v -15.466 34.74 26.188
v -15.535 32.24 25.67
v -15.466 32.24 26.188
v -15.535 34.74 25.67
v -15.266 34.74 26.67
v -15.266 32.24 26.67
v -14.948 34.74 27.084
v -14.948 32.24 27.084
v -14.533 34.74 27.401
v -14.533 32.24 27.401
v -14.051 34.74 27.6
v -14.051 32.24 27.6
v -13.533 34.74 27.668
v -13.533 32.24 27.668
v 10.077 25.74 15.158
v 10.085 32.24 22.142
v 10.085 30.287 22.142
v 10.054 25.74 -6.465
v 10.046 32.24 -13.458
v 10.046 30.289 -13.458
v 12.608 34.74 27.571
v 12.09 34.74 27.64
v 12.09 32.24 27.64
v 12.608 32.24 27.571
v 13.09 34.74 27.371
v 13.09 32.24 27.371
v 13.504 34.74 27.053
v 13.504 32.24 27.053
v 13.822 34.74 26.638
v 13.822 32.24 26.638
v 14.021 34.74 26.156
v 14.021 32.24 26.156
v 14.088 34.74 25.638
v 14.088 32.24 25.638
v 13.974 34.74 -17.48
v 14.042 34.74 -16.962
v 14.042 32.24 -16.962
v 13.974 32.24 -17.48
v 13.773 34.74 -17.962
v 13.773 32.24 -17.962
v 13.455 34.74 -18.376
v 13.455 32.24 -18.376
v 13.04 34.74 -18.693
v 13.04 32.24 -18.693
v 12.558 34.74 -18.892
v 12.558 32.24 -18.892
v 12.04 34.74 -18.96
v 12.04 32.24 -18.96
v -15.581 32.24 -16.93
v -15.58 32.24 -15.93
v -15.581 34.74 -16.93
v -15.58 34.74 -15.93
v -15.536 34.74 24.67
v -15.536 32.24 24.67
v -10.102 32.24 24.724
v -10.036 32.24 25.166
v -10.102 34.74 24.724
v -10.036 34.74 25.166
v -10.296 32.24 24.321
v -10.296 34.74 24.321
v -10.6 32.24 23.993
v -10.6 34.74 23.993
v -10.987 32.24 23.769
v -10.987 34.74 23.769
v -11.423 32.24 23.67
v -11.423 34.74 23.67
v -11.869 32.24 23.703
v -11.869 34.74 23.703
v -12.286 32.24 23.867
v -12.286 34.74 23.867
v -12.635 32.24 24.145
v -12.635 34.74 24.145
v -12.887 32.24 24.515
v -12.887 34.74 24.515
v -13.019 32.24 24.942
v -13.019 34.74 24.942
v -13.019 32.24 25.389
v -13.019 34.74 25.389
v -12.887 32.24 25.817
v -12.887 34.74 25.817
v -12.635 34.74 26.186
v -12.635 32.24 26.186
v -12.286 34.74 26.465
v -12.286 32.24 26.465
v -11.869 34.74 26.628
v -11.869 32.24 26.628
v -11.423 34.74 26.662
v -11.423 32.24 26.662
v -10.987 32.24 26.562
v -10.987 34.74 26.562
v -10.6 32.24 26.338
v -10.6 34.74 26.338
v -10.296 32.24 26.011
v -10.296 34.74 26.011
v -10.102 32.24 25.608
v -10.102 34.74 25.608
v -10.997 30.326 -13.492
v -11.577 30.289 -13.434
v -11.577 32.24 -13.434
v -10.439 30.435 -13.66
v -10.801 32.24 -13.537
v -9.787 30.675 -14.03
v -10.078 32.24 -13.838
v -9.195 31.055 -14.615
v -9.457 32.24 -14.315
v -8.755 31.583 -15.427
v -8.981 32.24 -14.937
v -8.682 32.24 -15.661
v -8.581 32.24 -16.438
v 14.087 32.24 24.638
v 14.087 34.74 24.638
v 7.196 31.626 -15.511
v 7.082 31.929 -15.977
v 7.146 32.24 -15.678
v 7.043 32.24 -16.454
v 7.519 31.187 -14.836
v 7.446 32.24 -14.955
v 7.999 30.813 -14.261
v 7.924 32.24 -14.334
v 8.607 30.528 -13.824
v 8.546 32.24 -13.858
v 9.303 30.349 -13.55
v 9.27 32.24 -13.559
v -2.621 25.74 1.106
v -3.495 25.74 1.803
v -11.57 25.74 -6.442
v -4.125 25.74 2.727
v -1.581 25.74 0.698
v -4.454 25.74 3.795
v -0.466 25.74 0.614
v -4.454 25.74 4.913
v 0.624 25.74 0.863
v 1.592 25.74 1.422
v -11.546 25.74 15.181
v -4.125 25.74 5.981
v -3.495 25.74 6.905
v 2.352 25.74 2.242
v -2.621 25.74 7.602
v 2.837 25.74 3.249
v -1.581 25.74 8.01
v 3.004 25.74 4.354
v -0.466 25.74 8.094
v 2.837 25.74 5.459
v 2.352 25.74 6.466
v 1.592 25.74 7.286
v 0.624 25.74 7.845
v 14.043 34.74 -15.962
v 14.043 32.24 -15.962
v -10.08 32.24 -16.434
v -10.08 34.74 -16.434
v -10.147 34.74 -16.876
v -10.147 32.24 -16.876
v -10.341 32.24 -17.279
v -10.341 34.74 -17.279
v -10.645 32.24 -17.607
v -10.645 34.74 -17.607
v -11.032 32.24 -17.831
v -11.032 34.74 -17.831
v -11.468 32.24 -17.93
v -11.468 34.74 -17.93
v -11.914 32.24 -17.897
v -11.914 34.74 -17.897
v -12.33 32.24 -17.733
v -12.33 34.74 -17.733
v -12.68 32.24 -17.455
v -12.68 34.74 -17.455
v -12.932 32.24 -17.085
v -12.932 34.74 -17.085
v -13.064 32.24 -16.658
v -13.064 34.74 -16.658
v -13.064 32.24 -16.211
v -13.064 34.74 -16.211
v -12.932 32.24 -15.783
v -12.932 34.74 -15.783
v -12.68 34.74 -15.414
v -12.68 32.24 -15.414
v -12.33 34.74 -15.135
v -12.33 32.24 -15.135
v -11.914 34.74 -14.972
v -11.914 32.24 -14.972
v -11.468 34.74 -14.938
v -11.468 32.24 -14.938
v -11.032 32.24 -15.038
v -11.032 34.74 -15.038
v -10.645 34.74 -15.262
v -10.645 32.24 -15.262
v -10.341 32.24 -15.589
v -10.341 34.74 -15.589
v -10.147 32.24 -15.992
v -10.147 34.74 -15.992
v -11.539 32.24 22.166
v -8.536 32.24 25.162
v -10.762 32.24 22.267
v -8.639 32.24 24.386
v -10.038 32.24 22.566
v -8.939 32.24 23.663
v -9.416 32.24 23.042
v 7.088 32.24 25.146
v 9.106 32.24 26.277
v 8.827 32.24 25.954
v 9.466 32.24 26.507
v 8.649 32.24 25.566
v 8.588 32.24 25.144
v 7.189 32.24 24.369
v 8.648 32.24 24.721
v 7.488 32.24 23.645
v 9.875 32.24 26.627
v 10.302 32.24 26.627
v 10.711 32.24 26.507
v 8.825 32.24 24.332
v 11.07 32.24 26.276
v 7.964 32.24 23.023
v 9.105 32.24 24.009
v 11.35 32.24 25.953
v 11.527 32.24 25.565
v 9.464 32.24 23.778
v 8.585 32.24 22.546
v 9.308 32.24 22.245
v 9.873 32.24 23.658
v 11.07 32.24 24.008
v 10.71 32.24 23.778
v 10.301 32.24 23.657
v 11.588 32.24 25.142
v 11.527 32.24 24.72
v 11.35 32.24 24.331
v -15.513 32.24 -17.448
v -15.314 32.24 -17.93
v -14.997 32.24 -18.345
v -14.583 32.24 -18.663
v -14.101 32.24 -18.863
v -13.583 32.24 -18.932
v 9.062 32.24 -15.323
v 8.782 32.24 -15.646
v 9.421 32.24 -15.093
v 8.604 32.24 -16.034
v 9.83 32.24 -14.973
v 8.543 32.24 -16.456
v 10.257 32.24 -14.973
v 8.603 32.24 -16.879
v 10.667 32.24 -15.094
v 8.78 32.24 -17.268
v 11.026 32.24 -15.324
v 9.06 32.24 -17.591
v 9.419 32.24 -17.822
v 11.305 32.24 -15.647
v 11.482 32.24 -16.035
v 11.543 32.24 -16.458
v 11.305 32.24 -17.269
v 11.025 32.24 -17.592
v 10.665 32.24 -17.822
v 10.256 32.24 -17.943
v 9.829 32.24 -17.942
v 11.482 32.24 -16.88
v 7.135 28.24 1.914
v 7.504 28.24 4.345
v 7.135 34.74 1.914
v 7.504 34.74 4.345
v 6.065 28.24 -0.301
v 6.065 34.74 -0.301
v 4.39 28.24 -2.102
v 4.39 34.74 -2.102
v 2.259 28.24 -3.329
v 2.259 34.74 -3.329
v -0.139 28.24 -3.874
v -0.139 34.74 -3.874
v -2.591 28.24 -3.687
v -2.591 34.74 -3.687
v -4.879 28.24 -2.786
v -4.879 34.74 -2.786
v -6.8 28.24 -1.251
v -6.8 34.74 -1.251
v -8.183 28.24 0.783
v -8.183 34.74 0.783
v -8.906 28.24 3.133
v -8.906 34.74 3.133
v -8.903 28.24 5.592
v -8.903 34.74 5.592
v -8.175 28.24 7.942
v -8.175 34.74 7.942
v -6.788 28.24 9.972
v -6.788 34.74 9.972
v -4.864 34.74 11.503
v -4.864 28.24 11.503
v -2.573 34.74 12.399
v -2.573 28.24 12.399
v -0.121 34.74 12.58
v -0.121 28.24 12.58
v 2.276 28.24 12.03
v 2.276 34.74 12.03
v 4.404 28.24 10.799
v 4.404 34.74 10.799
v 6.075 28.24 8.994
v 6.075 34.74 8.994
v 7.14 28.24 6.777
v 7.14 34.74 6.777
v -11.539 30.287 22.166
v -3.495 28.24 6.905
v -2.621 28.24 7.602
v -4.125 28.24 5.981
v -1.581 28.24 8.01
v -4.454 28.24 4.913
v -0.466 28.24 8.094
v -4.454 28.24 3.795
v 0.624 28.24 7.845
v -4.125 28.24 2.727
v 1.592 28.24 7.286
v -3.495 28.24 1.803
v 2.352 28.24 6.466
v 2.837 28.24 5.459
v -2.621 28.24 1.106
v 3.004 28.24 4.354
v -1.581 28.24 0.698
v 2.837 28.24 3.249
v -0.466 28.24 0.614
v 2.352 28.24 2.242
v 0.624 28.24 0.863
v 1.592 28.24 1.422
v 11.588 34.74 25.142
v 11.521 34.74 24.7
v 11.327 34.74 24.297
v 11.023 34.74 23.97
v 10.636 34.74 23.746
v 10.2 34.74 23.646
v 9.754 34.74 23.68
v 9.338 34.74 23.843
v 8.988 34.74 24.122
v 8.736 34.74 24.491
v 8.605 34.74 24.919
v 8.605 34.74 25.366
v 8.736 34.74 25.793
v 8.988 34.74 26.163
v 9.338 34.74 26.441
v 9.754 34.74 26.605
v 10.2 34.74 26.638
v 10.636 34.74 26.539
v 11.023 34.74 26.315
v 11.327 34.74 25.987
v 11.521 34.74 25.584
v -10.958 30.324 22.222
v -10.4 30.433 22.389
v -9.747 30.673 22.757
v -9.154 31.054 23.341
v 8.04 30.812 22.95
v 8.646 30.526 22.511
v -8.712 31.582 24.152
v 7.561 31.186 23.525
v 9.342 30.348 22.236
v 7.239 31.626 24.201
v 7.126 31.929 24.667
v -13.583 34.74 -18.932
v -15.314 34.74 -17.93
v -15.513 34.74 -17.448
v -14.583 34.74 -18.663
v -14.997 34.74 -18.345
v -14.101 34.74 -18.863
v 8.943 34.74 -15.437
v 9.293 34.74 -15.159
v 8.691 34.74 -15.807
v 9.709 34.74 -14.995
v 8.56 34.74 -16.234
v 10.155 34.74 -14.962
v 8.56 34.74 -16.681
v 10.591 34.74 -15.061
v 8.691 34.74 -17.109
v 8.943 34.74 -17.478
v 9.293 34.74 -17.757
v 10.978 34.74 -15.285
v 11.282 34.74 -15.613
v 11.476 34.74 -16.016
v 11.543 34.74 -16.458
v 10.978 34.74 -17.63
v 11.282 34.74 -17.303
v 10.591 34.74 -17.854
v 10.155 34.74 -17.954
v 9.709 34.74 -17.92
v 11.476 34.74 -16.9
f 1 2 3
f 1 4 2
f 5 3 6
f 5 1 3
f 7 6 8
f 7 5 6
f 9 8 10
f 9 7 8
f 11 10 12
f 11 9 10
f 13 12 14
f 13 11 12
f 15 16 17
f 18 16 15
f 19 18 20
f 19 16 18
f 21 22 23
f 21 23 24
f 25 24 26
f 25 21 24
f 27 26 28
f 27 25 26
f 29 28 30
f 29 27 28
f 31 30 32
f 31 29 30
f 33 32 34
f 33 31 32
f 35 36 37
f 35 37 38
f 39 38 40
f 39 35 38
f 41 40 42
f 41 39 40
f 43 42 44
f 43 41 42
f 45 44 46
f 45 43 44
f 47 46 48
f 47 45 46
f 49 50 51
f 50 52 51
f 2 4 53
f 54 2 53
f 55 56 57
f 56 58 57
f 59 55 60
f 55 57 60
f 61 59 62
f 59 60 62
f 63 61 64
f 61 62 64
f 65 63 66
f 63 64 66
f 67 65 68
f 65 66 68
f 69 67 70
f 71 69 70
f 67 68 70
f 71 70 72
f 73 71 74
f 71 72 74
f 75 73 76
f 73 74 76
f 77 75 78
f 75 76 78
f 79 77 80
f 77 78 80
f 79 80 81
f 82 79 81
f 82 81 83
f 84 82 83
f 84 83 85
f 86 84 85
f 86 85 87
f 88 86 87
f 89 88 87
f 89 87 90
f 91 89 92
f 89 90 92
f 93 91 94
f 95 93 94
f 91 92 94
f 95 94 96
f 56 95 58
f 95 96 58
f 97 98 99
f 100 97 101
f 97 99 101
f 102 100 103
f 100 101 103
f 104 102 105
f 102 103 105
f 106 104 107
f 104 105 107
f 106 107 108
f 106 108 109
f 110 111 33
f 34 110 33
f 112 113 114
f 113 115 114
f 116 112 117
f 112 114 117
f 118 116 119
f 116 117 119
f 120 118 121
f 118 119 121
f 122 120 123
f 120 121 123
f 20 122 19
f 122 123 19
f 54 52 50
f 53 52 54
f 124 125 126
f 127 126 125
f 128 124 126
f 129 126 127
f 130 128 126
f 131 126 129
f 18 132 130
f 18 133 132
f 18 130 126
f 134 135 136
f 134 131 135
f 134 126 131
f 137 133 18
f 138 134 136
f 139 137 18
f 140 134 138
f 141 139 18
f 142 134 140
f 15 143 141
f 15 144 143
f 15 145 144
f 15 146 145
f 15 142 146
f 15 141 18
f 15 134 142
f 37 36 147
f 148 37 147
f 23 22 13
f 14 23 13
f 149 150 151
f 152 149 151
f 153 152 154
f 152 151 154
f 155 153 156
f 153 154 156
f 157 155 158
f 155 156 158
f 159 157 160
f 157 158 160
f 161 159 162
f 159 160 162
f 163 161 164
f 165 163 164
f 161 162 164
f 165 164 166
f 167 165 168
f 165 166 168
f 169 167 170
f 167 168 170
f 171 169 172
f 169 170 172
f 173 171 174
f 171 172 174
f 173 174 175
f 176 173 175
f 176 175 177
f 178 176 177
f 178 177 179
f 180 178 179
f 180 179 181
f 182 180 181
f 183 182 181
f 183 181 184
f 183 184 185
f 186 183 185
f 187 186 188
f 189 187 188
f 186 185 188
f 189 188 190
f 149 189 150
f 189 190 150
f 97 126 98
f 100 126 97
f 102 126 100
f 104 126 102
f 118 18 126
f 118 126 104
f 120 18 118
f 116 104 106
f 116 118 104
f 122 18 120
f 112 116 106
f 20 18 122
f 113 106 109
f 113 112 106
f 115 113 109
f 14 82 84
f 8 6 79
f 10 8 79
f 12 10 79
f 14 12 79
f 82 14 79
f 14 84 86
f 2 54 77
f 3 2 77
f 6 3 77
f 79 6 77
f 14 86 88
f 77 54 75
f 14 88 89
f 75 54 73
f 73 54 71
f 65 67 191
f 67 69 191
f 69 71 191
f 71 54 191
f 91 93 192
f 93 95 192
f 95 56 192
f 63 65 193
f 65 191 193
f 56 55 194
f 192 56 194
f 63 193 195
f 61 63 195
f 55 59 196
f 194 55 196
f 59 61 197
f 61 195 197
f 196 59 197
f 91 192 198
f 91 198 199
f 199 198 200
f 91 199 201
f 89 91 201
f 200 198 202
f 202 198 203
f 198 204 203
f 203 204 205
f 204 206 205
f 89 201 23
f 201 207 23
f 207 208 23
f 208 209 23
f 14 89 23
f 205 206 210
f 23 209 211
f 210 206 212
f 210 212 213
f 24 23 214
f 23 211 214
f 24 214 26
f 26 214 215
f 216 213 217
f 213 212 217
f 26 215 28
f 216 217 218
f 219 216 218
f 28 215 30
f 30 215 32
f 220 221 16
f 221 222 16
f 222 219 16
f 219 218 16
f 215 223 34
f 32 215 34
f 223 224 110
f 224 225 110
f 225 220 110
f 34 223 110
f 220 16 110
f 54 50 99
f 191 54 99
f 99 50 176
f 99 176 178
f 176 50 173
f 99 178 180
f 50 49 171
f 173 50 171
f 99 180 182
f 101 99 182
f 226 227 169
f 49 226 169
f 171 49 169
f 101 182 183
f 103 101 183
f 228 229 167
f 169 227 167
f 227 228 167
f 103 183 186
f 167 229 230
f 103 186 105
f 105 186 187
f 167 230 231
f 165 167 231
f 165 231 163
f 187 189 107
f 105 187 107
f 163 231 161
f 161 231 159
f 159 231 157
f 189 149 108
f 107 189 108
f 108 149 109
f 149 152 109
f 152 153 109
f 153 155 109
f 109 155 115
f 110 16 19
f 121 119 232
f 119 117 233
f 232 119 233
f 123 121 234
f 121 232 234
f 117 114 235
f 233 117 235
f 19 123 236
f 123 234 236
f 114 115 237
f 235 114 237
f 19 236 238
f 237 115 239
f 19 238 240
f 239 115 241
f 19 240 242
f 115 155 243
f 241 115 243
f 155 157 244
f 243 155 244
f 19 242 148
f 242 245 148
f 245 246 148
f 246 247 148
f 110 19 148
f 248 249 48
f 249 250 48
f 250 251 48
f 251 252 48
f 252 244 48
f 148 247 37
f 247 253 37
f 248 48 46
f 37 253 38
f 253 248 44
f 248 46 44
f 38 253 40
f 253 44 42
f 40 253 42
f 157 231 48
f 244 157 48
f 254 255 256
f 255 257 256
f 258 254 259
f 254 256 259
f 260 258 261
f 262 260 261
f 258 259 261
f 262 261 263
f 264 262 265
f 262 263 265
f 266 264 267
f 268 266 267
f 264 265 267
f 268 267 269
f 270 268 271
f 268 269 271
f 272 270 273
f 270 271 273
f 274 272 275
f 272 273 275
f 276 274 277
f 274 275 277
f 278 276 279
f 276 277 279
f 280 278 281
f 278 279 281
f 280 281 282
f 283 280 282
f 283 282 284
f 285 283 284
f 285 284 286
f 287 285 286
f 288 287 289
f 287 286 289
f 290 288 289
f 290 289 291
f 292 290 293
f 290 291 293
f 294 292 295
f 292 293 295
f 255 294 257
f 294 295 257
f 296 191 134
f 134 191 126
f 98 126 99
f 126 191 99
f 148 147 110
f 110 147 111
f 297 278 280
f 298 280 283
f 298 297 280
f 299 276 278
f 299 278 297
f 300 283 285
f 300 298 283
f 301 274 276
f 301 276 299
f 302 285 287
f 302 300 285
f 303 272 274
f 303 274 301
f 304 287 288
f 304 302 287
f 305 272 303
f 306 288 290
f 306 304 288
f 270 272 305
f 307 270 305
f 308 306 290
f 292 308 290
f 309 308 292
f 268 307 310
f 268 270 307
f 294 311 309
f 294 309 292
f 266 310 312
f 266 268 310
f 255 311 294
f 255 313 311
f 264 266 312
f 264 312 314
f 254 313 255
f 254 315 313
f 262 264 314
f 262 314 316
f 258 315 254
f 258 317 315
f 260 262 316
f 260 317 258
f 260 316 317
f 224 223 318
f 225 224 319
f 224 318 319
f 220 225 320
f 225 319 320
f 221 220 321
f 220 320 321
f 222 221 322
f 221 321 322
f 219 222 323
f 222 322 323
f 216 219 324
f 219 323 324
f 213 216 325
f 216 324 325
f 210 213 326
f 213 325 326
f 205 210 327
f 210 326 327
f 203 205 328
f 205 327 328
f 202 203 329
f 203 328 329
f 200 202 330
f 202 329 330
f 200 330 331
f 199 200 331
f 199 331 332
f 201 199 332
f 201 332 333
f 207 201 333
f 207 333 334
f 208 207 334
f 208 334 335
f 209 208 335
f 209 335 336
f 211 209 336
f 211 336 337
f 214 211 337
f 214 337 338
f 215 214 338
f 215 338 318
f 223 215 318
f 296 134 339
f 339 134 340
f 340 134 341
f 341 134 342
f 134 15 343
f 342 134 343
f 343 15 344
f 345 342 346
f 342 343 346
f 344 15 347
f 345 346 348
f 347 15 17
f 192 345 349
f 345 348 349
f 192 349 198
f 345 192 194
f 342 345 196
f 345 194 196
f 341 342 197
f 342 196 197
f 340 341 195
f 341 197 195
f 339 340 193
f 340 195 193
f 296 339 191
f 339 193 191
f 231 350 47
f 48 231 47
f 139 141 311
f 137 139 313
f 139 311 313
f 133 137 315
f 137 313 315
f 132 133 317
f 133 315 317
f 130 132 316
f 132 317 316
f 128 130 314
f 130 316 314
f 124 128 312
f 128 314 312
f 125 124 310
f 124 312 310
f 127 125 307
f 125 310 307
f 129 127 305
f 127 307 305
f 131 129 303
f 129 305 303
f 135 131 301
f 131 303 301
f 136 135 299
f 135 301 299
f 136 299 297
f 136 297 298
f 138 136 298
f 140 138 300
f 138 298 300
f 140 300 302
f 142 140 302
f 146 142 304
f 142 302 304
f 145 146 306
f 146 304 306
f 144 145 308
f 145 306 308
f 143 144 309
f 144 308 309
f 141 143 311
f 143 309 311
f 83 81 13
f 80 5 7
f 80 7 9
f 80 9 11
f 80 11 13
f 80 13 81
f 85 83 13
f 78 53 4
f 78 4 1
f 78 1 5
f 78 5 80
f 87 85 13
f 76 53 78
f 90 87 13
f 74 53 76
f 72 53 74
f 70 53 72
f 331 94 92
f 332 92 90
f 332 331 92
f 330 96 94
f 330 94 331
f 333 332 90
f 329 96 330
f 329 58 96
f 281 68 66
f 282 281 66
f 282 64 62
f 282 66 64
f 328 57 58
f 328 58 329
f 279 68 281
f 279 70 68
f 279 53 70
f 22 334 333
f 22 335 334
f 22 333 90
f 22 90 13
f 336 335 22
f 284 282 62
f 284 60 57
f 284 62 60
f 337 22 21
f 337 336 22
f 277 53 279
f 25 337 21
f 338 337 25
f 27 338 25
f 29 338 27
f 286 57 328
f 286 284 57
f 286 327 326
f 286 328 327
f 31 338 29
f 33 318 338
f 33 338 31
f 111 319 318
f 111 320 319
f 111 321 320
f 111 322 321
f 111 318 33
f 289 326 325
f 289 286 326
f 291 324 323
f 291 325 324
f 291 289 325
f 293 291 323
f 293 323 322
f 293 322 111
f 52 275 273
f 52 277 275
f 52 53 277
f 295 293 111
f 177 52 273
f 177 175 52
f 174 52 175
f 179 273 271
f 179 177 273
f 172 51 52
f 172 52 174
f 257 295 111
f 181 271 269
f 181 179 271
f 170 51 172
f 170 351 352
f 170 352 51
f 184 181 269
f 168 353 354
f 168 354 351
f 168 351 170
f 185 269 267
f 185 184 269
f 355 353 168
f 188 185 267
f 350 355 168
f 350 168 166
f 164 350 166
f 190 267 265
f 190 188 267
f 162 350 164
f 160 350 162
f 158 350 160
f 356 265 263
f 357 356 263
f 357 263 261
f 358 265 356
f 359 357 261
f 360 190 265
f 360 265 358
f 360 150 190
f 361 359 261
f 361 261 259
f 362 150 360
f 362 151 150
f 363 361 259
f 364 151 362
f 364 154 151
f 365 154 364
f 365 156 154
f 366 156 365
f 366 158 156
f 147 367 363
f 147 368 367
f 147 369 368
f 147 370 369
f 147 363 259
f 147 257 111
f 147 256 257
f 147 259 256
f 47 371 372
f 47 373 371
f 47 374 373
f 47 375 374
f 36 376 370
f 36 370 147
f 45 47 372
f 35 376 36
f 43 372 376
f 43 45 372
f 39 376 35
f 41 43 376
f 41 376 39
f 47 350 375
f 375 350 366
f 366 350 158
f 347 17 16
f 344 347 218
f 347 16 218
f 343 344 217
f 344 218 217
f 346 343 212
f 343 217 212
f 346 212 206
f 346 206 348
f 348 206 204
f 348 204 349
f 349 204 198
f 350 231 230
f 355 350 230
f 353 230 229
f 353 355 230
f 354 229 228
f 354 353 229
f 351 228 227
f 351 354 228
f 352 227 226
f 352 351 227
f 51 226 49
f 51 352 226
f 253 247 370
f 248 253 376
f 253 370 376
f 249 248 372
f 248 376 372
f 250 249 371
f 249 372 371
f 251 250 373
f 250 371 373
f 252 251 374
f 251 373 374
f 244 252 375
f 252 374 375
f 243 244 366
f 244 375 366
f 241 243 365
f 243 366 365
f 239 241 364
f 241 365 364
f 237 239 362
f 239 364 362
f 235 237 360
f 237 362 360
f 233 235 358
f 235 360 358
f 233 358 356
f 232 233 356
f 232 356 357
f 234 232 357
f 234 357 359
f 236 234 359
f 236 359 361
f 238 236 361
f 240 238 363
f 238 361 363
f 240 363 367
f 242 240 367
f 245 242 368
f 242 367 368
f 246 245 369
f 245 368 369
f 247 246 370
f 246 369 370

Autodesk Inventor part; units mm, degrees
ref_plane "YZ Plane" through (0, 0, 0) normal (1, 0, 0) x (0, 1, 0)
sketch "Sketch1" plane through (0, 0, 0) normal (0, 0, 1) x (1, 0, 0)
  circle A0 centre (10.25, -9.75) radius 1.1 projected
  circle A1 centre (-10.25, -9.75) radius 1.1 projected
  circle A2 centre (-10.25, 3.75) radius 1.1 projected
  circle A3 centre (10.25, 3.75) radius 1.1 projected
  circle A4 centre (9.25, -4) radius 1.5 projected
  circle A5 centre (-9.25, -4) radius 1.5 projected
  arc A6 (7.25, -4) -> (11.25, -4) centre (9.25, -4) ccw
  arc A7 (-11.25, -4) -> (-7.25, -4) centre (-9.25, -4) ccw
  line L0 (8.2, -12) -> (-8.2, -12) projected
  line L1 (12.5, 1) -> (12.5, -7.7) projected
  line L2 (-12.5, 12) -> (12.5, 12) projected
  line L3 (-12.5, -7.7) -> (-12.5, 1) projected
  line L4 (12.5, -12) -> (-12.5, -12)
  line L5 (-12.5, -12) -> (-12.5, 12)
  line L6 (-12.5, 12) -> (12.5, 12)
  line L7 (12.5, 12) -> (12.5, -12)
  line L8 (-9.25, -4) -> (-9.25, -3)
  line L9 (9.25, -4) -> (9.25, -3)
  line L10 (-11.25, -4) -> (-11.25, -3)
  line L11 (-7.25, -4) -> (-7.25, -3)
  line L12 (7.25, -4) -> (7.25, -3)
  line L13 (11.25, -4) -> (11.25, -3)
  arc A8 (-9.25, -5) -> (-7.7976, -4.375) centre (-9.25, -3) ccw
  arc A9 (-7.25, -3) -> (-11.25, -3) centre (-9.25, -3) ccw
  arc A10 (9.25, -5) -> (10.7024, -4.375) centre (9.25, -3) ccw
  arc A11 (11.25, -3) -> (7.25, -3) centre (9.25, -3) ccw
  point P0 (0, 0)
  dimension "d0" = 0.5
  dimension "d1" = 0.5
  dimension "d70" = 1
  dimension "d74" = 3.25
extrude "Extrusion1" add sketch "Sketch1" along normal blind 3 contours L0 L4 L5 L3 L2 L7 L1
sketch "Sketch2" plane through (-12.5, 12, 0) normal (0, 1, 0) x (1, 0, 0)
  line L0 (25, 0) -> (0, 0) projected
  line L1 (0, 0) -> (0, -3) projected
  line L2 (25, -3) -> (0, -3) projected
  line L3 (25, 0) -> (25, -3) projected
  point P0 (12.5, 0)
extrude "Extrusion2" add sketch "Sketch2" along normal blind 2
sketch "Sketch3" plane through (-12.5, 14, 0) normal (0, 1, 0) x (1, 0, 0)
  line L0 (0, 1) -> (25, 1) projected
  line L1 (25, 0) -> (0, 0) projected
  line L2 (0, -3) -> (25, -3) projected
  line L3 (0, -4) -> (25, -4)
  line L4 (0, 1) -> (25, 1)
  line L5 (25, 1) -> (25, -4)
  line L6 (25, -4) -> (0, -4)
  line L7 (0, -4) -> (0, 1)
  point P0 (12.5, 0)
  dimension "d6" = 1
extrude "Extrusion3" add sketch "Sketch3" along normal blind 7.5
sketch "Sketch8" plane through (-12.5, -12, 0) normal (-1, 0, 0) x (0, 0, 1)
  line L0 (4, 24) -> (3, 24)
  line L1 (3, 26) -> (4, 26) projected
  line L2 (3, 0) -> (3, 26) projected
  line L3 (0, 0) -> (0, 26) projected
  line L4 (-1, 26) -> (0, 26) projected
  line L5 (4, 24.1) -> (3, 24.1)
  line L6 (4, 24.1) -> (-1, 24.1)
  line L7 (0, 24.1) -> (-1, 24.1)
  line L8 (-1, 24.1) -> (-1, 26)
  line L9 (-1, 26) -> (0, 26)
  line L10 (0, 26) -> (0, 24.1)
  line L11 (3, 24.1) -> (4, 24.1)
  line L12 (4, 24.1) -> (4, 26)
  line L13 (4, 26) -> (3, 26)
  line L14 (3, 26) -> (3, 24.1)
  point P0 (0, 12)
  dimension "d22" = 0.1
extrude "Extrusion7" add sketch "Sketch8" against normal up to surface (25 mm away)
sketch "Sketch9" plane through (0, 0, 3) normal (0, 0, 1) x (1, 0, 0)
  circle A0 centre (10.25, -9.75) radius 1.1
  circle A1 centre (10.25, 3.75) radius 1.1
  circle A2 centre (-10.25, 3.75) radius 1.1
  circle A3 centre (-10.25, -9.75) radius 1.1
  circle A4 centre (-10.25, -9.75) radius 1
  circle A5 centre (-10.25, 3.75) radius 1
  circle A6 centre (10.25, 3.75) radius 1
  circle A7 centre (10.25, -9.75) radius 1
  point P0 (0, 0)
  dimension "d25" = 0.1
  dimension "d26" = 0.1
  dimension "d27" = 0.1
  dimension "d28" = 0.1
ref_plane "Work Plane1" through (-12.5, 0.8429, -0.9) normal (0, 0, -1) x (0, 1, 0)
extrude "Extrusion8" add sketch "Sketch9" against normal up to surface (3.9 mm away) contours A4 | A5 | A6 | A7
sketch "Sketch10" plane through (-10.25, 3.75, 3) normal (0, 0, 1) x (1, 0, 0)
  circle A0 centre (0, 0) radius 1.1
  circle A1 centre (0, -13.5) radius 1.1
  circle A2 centre (20.5, -13.5) radius 1.1
  circle A3 centre (20.5, 0) radius 1.1
  point P0 (10.25, -3.75)
extrude "Extrusion9" add sketch "Sketch10" against normal up to surface (3 mm away)
sketch "Sketch11" plane through (0, 0, 3) normal (0, 0, 1) x (1, 0, 0)
  circle A0 centre (10.25, -9.75) radius 1 projected
  circle A1 centre (10.25, 3.75) radius 1 projected
  circle A2 centre (-10.25, 3.75) radius 1 projected
  circle A3 centre (-10.25, -9.75) radius 1 projected
  point P0 (0, 0)
ref_plane "Work Plane2" through (8.65, 0.8429, 3.9) normal (0, 0, 1) x (1, 0, 0)
extrude "Extrusion10" add sketch "Sketch11" along normal up to surface (0.9 mm away)
sketch "Sketch12" plane through (-12.5, 21.5, 4) normal (0, 0, 1) x (1, 0, 0)
  line L0 (25, -9.4) -> (25, 0) projected
  line L1 (25, 0) -> (25, -4.7)
  line L2 (25, -4.7) -> (30, -4.7)
  line L3 (30, -4.7) -> (30, 0)
  line L4 (30, 0) -> (25, 0)
  line L5 (25, 0) -> (25, -4.7)
  line L6 (0, -9.4) -> (0, 0) projected
  line L7 (0, 0) -> (25, 0) projected
  line L8 (0, 0) -> (-5, 0)
  line L9 (-5, 0) -> (-5, -4.7)
  line L10 (-5, -4.7) -> (0, -4.7)
  line L11 (0, -4.7) -> (0, 0)
  point P0 (12.5, -21.5)
  dimension "d35" = 5
  dimension "d36" = 5
extrude "Extrusion11" add sketch "Sketch12" against normal up to surface (5 mm away)
sketch "Sketch13" plane through (-12.5, -12, 0) normal (0, -1, 0) x (1, 0, 0)
  line L0 (0, 0) -> (0, 3) projected
  line L1 (25, 0) -> (25, 3) projected
  line L2 (25.2, 0) -> (25.2, 3)
  line L3 (-0.2, 0) -> (-0.2, 3)
  line L4 (-5, 4) -> (-5, -1) projected
  line L5 (-5, -1) -> (0, -1) projected
  line L6 (-5, 4) -> (0, 4) projected
  line L7 (25, -1) -> (30, -1) projected
  line L8 (30, 4) -> (30, -1) projected
  line L9 (25, 4) -> (30, 4) projected
  line L10 (30, -1) -> (25.2, -1)
  line L11 (25.2, -1) -> (25.2, 4)
  line L12 (25.2, 4) -> (30, 4)
  line L13 (30, 4) -> (30, -1)
  line L14 (-5, -1) -> (-0.2, -1)
  line L15 (-0.2, -1) -> (-0.2, 4)
  line L16 (-0.2, 4) -> (-5, 4)
  line L17 (-5, 4) -> (-5, -1)
  line L18 (0, 0) -> (25, 0) projected
  line L19 (0, 0) -> (-0.2, 0)
  line L20 (0, 3) -> (-0.2, 3)
  line L21 (25, -1) -> (25, 0) projected
  line L22 (25, 0) -> (25.2, 0)
  line L23 (25, 3) -> (25.2, 3)
  point P0 (12.5, 0)
  point P1 (-0.2, 3)
  point P2 (-0.2, 0)
  dimension "d39" = 0.2
  dimension "d40" = 0.2
extrude "Extrusion12" add sketch "Sketch13" against normal blind 5.5 contours L19 L3 L20 L0 | L15 L5 L4 L6 L3 | L1 L23 L2 L22 | L2 L11 L9 L8 L7
sketch "Sketch14" plane through (-12.5, -6.5, 0) normal (0, 1, 0) x (1, 0, 0)
  circle A0 centre (-2.6, -1.5) radius 1.5
  circle A1 centre (27.6, -1.5) radius 1.5
  circle A2 centre (27.6, -1.5) radius 1.4
  circle A3 centre (-2.6, -1.5) radius 1.4
  point P0 (12.5, 0)
  dimension "d43" = 0.1
  dimension "d44" = 0.1
extrude "Extrusion13" cut sketch "Sketch14" against normal blind 5.5 contours A2 | A3
chamfer "Chamfer3" distance 0.2 angle 45 8 edges at (-12.7, -9.25, 4) (-17.5, -9.25, 4) (-12.7, -9.25, -1) (-17.5, -9.25, -1) (17.5, -9.25, 4) (12.7, -9.25, 4) (17.5, -9.25, -1) (12.7, -9.25, -1)
chamfer "Chamfer4" distance 3.9999 angle 45 2 edges at (-12.5, -6.5, 1.5) (12.5, -6.5, 1.5)
sketch "Sketch15" plane through (-17.5, 16.8, 4) normal (-1, 0, 0) x (0, 0, 1)
  circle A0 centre (-2.5, 2.35) radius 1.5
  circle A1 centre (-2.5, 2.35) radius 1.4
  point P0 (-4, -16.8)
  dimension "d53" = 0.1
extrude "Extrusion14" cut sketch "Sketch15" against normal blind 5.5 contours A1
sketch "Sketch16" plane through (17.5, 16.8, 4) normal (1, 0, 0) x (0, 0, -1)
  circle A0 centre (2.5, 2.35) radius 1.4 projected
  point P0 (4, -16.8)
extrude "Extrusion15" cut sketch "Sketch16" against normal blind 5.5
sketch "Sketch17" plane through (-12.5, 12.1, 4) normal (0, 0, 1) x (1, 0, 0)
  line L0 (25, 0) -> (25, 4.7) projected
  line L1 (0, 0) -> (0, 4.7) projected
  line L2 (30, 9.4) -> (-5, 9.4) projected
  line L3 (24.5905, 22.6402) -> (-1.0328, 22.6402)
  line L4 (25, 9.4) -> (0, 9.4)
  line L5 (0, 9.4) -> (0, 22.6402)
  line L6 (0, 22.6402) -> (25, 22.6402)
  line L7 (25, 22.6402) -> (25, 9.4)
  point P0 (12.5, -12.1)
  dimension "d58" = 25
extrude "Extrusion16" add sketch "Sketch17" against normal up to surface (5 mm away)
sketch "Sketch18" plane through (-12.5, 34.7402, 4) normal (0, 1, 0) x (1, 0, 0)
  circle A0 centre (22.5429, 20.4577) radius 1.5 construction
  circle A1 centre (22.5429, 20.4577) radius 1.5
  circle A2 centre (0.9195, 20.4343) radius 1.5
  circle A3 centre (22.5878, -21.1423) radius 1.5
  circle A4 centre (0.9645, -21.1657) radius 1.5
  line L0 (24.5905, -23.6401) -> (-1.0328, -23.6678)
  arc A5 (24.5905, -23.6401) -> (26.5884, -21.638) centre (24.5884, -21.6401) ccw
  line L1 (26.5873, -20.638) -> (26.5884, -21.638)
  arc A6 (-3.035, -21.67) -> (-1.0328, -23.6678) centre (-1.035, -21.6678) ccw
  line L2 (-3.035, -21.67) -> (-3.0361, -20.67)
  line L3 (26.5423, 20.962) -> (26.5434, 19.962)
  arc A7 (26.5423, 20.962) -> (24.5402, 22.9598) centre (24.5423, 20.9598) ccw
  line L4 (-1.0832, 22.9321) -> (24.5402, 22.9598)
  line L5 (-1.0832, 22.9321) -> (24.5402, 22.9598)
  arc A8 (-1.0832, 22.9321) -> (-3.081, 20.93) centre (-1.081, 20.9321) ccw
  line L6 (-3.08, 19.93) -> (-3.081, 20.93)
  line L7 (-3.08, 19.93) -> (-3.0361, -20.67)
  line L8 (26.5434, 19.962) -> (26.5873, -20.638)
  point P0 (12.5, 4)
extrude "Extrusion17" add sketch "Sketch18" against normal blind 2.5
sketch "Sketch22" plane through (-12.5, 32.2402, 4) normal (0, -1, 0) x (1, 0, 0)
  line L0 (40.0329, 38.7094) -> (-19.6341, 38.7094)
  line L1 (-19.6341, 38.7094) -> (-19.6341, -37.2102)
  line L2 (-19.6341, -37.2102) -> (40.0329, -37.2102)
  line L3 (40.0329, -37.2102) -> (40.0329, 38.7094)
  point P0 (12.5, -4)
extrude "Extrusion21" cut sketch "Sketch22" along normal blind 48.75
sketch "Sketch23" plane through (-12.5, 32.2402, 4) normal (0, -1, 0) x (1, 0, 0)
  circle A0 centre (0.9195, -20.4343) radius 1.5 projected
  circle A1 centre (0.9645, 21.1657) radius 1.5 projected
  circle A2 centre (22.5878, 21.1423) radius 1.5 projected
  circle A3 centre (22.5429, -20.4577) radius 1.5 projected
  circle A4 centre (0.9195, -20.4343) radius 3
  circle A5 centre (22.5429, -20.4577) radius 3
  circle A6 centre (22.5878, 21.1423) radius 3
  circle A7 centre (0.9645, 21.1657) radius 3
  circle A8 centre (0.9645, 21.1657) radius 1.5 projected
  circle A9 centre (22.5878, 21.1423) radius 1.5 projected
  circle A10 centre (0.9195, -20.4343) radius 1.5 projected
  circle A11 centre (22.5429, -20.4577) radius 1.5 projected
  line L0 (-3.035, 21.67) -> (-3.081, -20.93) projected
  arc A12 (-3.081, -20.93) -> (-1.0832, -22.9321) centre (-1.081, -20.9321) ccw projected
  line L1 (-1.0832, -22.9321) -> (24.5402, -22.9598) projected
  arc A13 (24.5402, -22.9598) -> (26.5423, -20.962) centre (24.5423, -20.9598) ccw projected
  line L2 (26.5423, -20.962) -> (26.5884, 21.638) projected
  arc A14 (26.5884, 21.638) -> (24.5905, 23.6401) centre (24.5884, 21.6401) ccw projected
  line L3 (24.5905, 23.6401) -> (-1.0328, 23.6678) projected
  arc A15 (-1.0328, 23.6678) -> (-3.035, 21.67) centre (-1.035, 21.6678) ccw projected
  line L4 (0.9645, 21.1657) -> (22.5429, -20.4577)
  circle A16 centre (11.7537, 0.354) radius 3.75
  line L5 (0.9645, 21.1657) -> (0.9195, -20.4343)
  line L6 (0.9195, -20.4343) -> (22.5429, -20.4577)
  line L7 (22.5878, 21.1423) -> (22.5429, -20.4577)
  line L8 (22.5878, 21.1423) -> (0.9645, 21.1657)
  point P0 (12.5, -4)
  point P1 (22.5461, -17.4577)
  point P2 (22.5846, 18.1423)
  point P3 (19.5878, 21.1455)
  point P4 (3.9645, 21.1624)
  point P5 (0.9612, 18.1657)
  point P6 (0.9227, -17.4343)
  point P7 (3.9195, -20.4375)
  point P8 (19.5429, -20.4544)
  dimension "d84" = 6
  dimension "d85" = 6
  dimension "d86" = 6
  dimension "d87" = 6
  dimension "d88" = 7.5
extrude "Extrusion22" add sketch "Sketch23" along normal blind 6.5 contours A4 L5 A7 L4 A16 A5 L6 | L4 A16 A7 L8 A6 L7 A5
sketch "Sketch26" plane through (-15.535, 34.7402, 25.67) normal (0, 1, 0) x (0.9999994, 0, -0.0010805)
  circle A0 centre (14.8117, 21.3) radius 3.75 projected
  point P0 (15.5627, 25.6532)
extrude "Extrusion24" cut sketch "Sketch26" against normal through all
sketch "Sketch27" plane through (-15.535, 34.7402, 25.67) normal (0, 1, 0) x (0.9999994, 0, -0.0010805)
  circle A0 centre (14.8117, 21.3) radius 3.75 projected
  circle A1 centre (14.8117, 21.3) radius 8.25
  point P0 (15.5627, 25.6532)
  dimension "d96" = 16.5
extrude "Extrusion25" cut sketch "Sketch27" against normal blind 6.5
sketch "Sketch28" plane through (10.0846, 25.7402, 22.1423) normal (0.9999994, 0, -0.0010805) x (-0.0010805, 0, -0.9999994)
  line L0 (35.6, 6.5) -> (35.6, 0) projected
  line L1 (35.6, 0) -> (0, 0) projected
  line L2 (38.6, 6.5) -> (38.6, 0) projected
  line L3 (38.6, 0) -> (35.6, 0) projected
  line L4 (39.1, 6.5) -> (-3.5, 6.5) projected
  line L5 (0, 6.5) -> (0, 0) projected
  line L6 (0, 0) -> (-3, 0) projected
  line L7 (-3, 6.5) -> (-3, 0) projected
  line L8 (28.6076, 0) -> (33.2318, -2.9777)
  line L9 (2.3601, -2.9777) -> (6.9843, 0)
  line L10 (28.6076, 0) -> (38.6, 6.5)
  line L11 (6.9843, 0) -> (-3, 6.5)
  point P0 (22.1532, -25.7402)
extrude "Extrusion26" cut sketch "Sketch28" against normal through all contours L10 L2 L3 L0 | L0 L1 L10 | L11 L5 L6 L7 | L11 L1 L5
properties part number "cameraholder_3DPrint"
